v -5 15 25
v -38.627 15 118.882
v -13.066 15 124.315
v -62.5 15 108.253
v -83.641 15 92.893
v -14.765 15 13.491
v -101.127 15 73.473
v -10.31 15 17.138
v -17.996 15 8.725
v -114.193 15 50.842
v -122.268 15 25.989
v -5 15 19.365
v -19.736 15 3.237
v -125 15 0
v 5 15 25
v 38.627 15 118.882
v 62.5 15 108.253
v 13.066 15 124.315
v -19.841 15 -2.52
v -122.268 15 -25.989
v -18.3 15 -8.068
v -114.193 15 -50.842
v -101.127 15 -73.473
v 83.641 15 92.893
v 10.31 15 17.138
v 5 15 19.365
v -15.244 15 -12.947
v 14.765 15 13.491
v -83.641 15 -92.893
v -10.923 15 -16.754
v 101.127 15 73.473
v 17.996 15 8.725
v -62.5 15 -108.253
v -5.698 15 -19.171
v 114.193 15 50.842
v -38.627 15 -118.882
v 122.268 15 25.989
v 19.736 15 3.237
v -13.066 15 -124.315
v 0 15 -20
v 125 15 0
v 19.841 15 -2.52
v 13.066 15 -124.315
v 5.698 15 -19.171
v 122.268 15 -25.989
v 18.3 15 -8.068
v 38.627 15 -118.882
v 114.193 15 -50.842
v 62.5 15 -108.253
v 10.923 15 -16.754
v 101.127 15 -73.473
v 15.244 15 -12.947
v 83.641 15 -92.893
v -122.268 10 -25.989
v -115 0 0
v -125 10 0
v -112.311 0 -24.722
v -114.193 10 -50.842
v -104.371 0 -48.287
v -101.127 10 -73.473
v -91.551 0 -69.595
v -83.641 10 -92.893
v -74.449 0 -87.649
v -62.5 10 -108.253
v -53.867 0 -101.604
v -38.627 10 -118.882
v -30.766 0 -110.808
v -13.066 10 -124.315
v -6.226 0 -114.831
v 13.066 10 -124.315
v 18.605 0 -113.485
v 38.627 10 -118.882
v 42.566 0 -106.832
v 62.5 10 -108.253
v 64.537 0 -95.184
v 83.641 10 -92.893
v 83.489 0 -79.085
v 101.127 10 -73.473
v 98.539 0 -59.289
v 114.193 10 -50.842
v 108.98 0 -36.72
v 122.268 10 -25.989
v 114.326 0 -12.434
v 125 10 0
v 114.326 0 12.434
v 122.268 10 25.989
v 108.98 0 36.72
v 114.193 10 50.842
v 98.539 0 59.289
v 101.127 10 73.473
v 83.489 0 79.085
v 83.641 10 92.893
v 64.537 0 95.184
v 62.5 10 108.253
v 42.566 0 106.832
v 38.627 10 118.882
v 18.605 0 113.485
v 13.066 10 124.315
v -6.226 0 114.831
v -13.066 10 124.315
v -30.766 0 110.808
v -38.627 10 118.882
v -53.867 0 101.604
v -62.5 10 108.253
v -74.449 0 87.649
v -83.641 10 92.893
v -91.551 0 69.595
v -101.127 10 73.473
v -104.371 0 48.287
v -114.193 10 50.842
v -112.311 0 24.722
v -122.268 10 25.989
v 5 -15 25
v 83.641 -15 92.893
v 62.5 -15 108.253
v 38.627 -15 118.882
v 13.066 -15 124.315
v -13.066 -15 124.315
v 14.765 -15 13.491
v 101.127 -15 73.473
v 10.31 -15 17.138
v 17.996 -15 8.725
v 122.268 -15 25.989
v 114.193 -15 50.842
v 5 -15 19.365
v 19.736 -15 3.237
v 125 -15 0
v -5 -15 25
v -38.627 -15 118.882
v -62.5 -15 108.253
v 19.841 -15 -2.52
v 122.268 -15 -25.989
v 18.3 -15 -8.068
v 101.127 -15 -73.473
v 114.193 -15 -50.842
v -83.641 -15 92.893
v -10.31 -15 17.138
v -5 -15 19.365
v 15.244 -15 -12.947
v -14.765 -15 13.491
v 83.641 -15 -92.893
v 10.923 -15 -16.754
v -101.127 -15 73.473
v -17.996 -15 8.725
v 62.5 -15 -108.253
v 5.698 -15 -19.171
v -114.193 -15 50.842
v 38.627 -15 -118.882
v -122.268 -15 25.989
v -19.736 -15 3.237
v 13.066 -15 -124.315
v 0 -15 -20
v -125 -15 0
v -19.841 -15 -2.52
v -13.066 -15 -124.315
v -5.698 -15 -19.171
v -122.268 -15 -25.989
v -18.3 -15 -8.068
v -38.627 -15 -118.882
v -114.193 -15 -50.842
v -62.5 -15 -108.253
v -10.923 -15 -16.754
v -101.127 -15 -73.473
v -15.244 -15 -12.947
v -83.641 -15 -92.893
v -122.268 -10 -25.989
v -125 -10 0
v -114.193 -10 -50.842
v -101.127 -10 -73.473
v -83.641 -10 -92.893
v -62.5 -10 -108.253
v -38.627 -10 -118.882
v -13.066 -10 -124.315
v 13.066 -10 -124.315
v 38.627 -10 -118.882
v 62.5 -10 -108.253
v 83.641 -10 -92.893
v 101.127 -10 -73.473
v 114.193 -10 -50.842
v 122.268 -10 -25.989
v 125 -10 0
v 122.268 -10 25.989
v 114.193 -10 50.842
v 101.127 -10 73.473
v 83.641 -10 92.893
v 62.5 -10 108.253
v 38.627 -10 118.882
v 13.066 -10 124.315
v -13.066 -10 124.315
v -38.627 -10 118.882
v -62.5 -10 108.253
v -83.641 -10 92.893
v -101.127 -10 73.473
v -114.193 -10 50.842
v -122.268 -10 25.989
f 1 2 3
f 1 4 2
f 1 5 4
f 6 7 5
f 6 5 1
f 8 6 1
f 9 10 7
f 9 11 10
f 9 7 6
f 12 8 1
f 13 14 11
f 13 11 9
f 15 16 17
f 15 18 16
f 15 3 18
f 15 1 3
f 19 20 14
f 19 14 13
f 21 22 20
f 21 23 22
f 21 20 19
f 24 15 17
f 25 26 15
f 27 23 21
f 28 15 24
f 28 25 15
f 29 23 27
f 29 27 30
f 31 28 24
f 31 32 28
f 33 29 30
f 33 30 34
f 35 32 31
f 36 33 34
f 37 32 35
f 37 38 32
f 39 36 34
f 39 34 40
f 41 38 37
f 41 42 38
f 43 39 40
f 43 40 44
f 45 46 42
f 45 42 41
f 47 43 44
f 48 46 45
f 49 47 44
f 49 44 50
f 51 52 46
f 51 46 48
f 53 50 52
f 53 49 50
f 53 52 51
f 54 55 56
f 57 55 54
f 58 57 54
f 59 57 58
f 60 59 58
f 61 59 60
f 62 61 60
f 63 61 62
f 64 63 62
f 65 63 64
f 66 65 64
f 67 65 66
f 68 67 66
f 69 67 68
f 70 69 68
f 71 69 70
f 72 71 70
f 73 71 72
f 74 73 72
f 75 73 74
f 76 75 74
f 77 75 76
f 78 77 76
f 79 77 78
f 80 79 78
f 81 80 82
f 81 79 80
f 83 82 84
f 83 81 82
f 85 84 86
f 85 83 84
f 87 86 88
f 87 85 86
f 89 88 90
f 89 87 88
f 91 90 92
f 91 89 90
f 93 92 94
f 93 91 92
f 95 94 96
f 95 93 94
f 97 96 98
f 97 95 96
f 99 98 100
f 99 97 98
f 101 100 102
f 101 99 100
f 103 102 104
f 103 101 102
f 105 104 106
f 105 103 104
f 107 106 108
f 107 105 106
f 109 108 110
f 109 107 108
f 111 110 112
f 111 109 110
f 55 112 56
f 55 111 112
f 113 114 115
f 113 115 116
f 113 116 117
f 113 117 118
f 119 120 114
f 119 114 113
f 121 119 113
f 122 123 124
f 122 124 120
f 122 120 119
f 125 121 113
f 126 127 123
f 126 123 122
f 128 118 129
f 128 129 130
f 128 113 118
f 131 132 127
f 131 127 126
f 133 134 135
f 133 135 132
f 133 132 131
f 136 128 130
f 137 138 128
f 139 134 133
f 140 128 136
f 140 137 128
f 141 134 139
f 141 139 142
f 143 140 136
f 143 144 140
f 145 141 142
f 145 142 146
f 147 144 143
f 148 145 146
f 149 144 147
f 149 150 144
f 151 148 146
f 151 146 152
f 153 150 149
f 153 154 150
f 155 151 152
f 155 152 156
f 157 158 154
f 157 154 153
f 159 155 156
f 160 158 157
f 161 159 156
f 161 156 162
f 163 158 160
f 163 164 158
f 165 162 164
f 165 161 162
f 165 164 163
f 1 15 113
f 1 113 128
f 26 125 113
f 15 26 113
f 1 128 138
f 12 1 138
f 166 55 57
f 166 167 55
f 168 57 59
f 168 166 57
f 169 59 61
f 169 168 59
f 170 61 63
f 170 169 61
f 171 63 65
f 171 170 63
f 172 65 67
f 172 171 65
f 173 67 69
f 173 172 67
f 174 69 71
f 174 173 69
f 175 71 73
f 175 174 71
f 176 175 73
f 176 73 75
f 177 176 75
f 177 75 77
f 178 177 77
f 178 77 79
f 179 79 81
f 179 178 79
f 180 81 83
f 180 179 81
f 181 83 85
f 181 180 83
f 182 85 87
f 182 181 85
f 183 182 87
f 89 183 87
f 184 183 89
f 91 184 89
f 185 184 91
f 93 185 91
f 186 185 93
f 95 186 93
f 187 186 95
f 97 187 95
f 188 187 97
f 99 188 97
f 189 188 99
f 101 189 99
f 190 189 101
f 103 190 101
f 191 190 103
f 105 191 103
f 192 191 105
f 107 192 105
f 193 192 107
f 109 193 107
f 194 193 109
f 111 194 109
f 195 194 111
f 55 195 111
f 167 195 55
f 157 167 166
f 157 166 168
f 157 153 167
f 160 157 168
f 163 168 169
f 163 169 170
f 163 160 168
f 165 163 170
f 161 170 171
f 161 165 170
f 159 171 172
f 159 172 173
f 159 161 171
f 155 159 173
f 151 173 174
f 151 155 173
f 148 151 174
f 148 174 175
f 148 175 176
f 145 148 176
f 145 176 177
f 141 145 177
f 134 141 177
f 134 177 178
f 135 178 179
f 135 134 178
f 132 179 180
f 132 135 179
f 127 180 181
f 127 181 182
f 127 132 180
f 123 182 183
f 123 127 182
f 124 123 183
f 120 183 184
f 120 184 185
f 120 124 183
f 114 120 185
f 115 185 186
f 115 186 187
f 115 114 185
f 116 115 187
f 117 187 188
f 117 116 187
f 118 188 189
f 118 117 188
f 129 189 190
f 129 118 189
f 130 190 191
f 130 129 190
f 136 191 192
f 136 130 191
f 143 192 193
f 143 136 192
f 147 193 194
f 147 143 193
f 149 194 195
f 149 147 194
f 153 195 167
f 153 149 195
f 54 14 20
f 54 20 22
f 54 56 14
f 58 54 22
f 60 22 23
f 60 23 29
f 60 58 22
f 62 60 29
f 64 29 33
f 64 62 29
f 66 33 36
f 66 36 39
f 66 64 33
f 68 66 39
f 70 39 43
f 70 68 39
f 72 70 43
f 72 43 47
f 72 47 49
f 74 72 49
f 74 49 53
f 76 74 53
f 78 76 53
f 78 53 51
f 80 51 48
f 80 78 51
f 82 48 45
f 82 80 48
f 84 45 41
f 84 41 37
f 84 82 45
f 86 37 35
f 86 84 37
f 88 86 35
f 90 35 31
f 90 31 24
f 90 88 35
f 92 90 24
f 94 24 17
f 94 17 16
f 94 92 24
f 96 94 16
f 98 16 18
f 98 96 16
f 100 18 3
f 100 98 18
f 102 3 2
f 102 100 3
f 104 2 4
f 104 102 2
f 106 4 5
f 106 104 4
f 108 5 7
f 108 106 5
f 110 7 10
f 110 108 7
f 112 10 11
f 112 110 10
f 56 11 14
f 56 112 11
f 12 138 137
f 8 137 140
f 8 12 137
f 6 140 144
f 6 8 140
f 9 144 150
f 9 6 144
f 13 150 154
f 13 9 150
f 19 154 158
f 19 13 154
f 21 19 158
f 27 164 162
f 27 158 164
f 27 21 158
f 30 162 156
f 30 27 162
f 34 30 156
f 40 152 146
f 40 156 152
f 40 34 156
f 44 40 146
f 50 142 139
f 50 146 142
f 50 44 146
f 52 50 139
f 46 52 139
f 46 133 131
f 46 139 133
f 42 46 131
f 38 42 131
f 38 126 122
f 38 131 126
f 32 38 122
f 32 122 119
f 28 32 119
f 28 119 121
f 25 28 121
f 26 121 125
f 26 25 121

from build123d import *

# Parameters (mm, degrees)
CUT_EXTRUDE1_DEPTH = 180.30421077


with BuildPart() as part:
    # Sketch1 → Revolve1 (revolve)
    with BuildSketch(Plane.XY):
        Polygon((0, 15), (125, 15), (125, 10), (115, 0), (125, -10), (125, -15), (0, -15), align=None)
    revolve(axis=Axis((0, -15, 0), (0, -1, 0)))

    # Sketch2 → Cut-Extrude1 (cut, through all)
    with BuildSketch(Plane(origin=(0, 15, 0), x_dir=(-1, 0, 0), z_dir=(0, 1, 0))):
        with BuildLine():
            Line((-5, 19.364916731), (-5, 25))
            Line((-5, 25), (5, 25))
            Line((5, 25), (5, 19.364916731))
            ThreePointArc((5, 19.364916731), (0, -20), (-5, 19.364916731))
        make_face()
    extrude(amount=-CUT_EXTRUDE1_DEPTH, mode=Mode.SUBTRACT)


solid = part.part
